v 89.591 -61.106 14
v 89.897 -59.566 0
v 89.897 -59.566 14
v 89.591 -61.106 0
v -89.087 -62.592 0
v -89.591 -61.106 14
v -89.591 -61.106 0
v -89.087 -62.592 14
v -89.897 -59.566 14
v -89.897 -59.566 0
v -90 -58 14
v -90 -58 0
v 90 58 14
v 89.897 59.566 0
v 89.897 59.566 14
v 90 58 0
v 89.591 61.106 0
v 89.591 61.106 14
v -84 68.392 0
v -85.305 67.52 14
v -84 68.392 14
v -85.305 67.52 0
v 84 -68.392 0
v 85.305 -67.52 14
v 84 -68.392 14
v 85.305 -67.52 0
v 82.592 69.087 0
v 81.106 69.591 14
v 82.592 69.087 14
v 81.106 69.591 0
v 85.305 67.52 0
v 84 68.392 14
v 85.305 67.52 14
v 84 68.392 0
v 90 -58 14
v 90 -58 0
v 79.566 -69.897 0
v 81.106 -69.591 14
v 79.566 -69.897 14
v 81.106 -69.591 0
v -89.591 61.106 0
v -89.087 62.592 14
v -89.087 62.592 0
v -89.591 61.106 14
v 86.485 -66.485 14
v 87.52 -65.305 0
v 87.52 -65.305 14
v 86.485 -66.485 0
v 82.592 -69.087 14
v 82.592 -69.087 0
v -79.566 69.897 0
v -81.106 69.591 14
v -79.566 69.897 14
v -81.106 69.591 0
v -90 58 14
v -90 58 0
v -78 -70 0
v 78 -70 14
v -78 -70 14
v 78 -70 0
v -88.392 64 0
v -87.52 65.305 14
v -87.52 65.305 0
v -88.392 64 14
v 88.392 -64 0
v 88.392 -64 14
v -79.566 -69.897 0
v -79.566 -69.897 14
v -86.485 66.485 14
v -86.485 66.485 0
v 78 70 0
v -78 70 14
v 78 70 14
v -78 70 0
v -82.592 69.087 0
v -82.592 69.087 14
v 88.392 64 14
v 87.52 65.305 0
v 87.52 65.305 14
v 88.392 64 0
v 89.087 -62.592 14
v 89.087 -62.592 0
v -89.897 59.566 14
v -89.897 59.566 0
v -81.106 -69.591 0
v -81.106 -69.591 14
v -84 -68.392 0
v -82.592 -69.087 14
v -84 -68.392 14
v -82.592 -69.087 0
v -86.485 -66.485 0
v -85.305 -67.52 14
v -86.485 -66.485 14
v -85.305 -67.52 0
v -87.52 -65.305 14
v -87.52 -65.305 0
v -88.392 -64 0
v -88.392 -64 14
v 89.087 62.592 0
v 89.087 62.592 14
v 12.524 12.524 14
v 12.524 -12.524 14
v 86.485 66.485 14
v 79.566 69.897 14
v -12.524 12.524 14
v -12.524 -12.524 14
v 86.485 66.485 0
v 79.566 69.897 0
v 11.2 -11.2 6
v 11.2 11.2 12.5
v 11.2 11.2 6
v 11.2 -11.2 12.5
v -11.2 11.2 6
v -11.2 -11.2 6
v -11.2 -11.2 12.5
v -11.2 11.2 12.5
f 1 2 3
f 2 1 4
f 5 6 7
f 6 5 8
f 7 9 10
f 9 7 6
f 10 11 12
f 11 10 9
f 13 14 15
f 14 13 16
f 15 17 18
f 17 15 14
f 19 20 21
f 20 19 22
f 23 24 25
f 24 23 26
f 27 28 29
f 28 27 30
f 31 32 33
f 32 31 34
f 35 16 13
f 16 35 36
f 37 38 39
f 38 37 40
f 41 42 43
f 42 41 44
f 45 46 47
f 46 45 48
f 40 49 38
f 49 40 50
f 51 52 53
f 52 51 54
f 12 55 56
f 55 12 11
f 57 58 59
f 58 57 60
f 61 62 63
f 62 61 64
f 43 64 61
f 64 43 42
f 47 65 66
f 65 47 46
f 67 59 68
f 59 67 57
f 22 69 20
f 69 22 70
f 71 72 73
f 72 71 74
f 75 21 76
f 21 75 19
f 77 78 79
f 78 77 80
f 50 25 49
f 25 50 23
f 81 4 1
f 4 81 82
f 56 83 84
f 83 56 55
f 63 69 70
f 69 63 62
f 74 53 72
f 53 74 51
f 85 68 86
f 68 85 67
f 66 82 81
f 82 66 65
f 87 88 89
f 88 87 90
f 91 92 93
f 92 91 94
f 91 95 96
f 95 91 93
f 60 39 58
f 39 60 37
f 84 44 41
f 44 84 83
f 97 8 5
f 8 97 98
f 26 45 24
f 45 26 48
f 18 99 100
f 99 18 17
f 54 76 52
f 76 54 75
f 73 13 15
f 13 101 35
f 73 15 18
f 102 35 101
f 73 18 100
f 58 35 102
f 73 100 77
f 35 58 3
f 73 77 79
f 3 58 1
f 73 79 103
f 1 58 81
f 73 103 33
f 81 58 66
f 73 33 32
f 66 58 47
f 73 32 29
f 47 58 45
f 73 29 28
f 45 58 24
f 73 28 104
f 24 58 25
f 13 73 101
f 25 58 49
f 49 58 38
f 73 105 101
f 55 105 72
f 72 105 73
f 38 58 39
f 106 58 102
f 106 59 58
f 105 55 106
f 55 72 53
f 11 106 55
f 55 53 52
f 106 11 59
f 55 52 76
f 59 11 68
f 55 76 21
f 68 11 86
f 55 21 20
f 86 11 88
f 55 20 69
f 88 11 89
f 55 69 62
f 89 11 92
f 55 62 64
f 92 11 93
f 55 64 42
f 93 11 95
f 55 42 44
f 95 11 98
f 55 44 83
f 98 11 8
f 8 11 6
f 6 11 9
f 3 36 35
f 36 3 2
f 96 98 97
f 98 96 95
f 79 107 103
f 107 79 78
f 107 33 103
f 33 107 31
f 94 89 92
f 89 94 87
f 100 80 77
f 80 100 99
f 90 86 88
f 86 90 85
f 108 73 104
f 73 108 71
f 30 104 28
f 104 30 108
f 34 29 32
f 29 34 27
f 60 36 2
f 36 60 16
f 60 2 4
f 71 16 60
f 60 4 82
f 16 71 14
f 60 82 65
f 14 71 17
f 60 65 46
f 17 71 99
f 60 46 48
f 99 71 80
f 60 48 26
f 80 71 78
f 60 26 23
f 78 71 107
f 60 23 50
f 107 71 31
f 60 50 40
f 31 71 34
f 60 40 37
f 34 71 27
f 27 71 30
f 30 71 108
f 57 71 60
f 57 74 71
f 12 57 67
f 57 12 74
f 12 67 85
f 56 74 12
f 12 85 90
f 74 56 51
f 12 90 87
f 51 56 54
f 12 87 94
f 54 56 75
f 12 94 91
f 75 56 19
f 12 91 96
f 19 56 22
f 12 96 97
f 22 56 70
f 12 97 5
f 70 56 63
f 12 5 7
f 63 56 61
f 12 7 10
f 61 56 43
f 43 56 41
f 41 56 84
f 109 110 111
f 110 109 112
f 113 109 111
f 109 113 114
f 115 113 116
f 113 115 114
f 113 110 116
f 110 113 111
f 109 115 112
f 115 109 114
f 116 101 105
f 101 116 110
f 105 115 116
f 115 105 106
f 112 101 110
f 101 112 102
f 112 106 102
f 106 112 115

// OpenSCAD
/* Headphone stand in three parts: base, post, hanger */
/* [Parts] */
part = "base"; // [base,post,hanger,assembly]

cadverify_only = "";
module instance(name, part, unit = 1) {
    echo(cadverify_instance = [name, part, unit]);
    if (cadverify_only == "" || cadverify_only == name) children();
}

// ---------- parameters (mm) ----------
base_L = 180;
base_W = 140;
base_H = 14;
base_corner_r = 12;
base_sock_S = 22.4;
base_sock_H = 8;
base_flare_H = 1.5;

post_bot_tenon_S = 22;
post_bot_tenon_H = 8;
post_bot_cham_H = 4;
post_body_bot_S = 30;
post_body_top_S = 24;
post_body_H = 232;
post_top_tenon_S = 18;
post_top_tenon_H = 8;
// total post height = 8+4+232+8 = 252

hanger_L = 110;
hanger_W = 44;
hanger_H = 20;
hanger_sock_S = 18.4;
hanger_sock_H = 8;
hanger_roof_H = 9.2; // half width, 45 deg pyramid

assembly_top = 270;
post_Z_in_assembly = 6;      // post print z0 sits at 6 in assembly
hanger_Z_in_assembly = 250;  // hanger print z0 sits at 250

// ---------- modules (print orientation, min z = 0) ----------
module base() {
    difference() {
        linear_extrude(height = base_H)
            hull() {
                translate([-base_L/2+base_corner_r, -base_W/2+base_corner_r]) circle(r = base_corner_r, $fn = 48);
                translate([ base_L/2-base_corner_r, -base_W/2+base_corner_r]) circle(r = base_corner_r, $fn = 48);
                translate([-base_L/2+base_corner_r,  base_W/2-base_corner_r]) circle(r = base_corner_r, $fn = 48);
                translate([ base_L/2-base_corner_r,  base_W/2-base_corner_r]) circle(r = base_corner_r, $fn = 48);
            }
        // straight socket 22.4 x 22.4 from z=6 to top
        translate([-base_sock_S/2, -base_sock_S/2, base_H - base_sock_H])
            cube([base_sock_S, base_sock_S, base_sock_H + 0.2]);
        // 45 deg entry flare, 1.5 tall: 22.4 at bottom -> 25.4 at top
        translate([0, 0, base_H - base_flare_H])
            linear_extrude(height = base_flare_H + 0.2, scale = (base_sock_S + 2*base_flare_H)/base_sock_S)
                square([base_sock_S, base_sock_S], center = true);
    }
}

module post() {
    // bottom tenon 22x22x8 on bed
    translate([-post_bot_tenon_S/2, -post_bot_tenon_S/2, 0])
        cube([post_bot_tenon_S, post_bot_tenon_S, post_bot_tenon_H]);
    // 45 deg frustum 22 -> 30, 4 tall
    translate([0, 0, post_bot_tenon_H])
        linear_extrude(height = post_bot_cham_H, scale = post_body_bot_S/post_bot_tenon_S)
            square([post_bot_tenon_S, post_bot_tenon_S], center = true);
    // tapered body 30 -> 24, 232 tall
    translate([0, 0, post_bot_tenon_H + post_bot_cham_H])
        linear_extrude(height = post_body_H, scale = post_body_top_S/post_body_bot_S)
            square([post_body_bot_S, post_body_bot_S], center = true);
    // top tenon 18x18x8
    translate([-post_top_tenon_S/2, -post_top_tenon_S/2, post_bot_tenon_H + post_bot_cham_H + post_body_H])
        cube([post_top_tenon_S, post_top_tenon_S, post_top_tenon_H]);
}

module hanger() {
    difference() {
        hull() {
            translate([-55, -22, 0]) cube([110, 44, 8]);
            translate([-50, -19, 0]) cube([20, 38, 14]);
            translate([-15, -16, 0]) cube([30, 32, 20]);
            translate([30, -19, 0]) cube([20, 38, 14]);
        }
        // straight socket 18.4x18.4, 0-8.1
        translate([-hanger_sock_S/2, -hanger_sock_S/2, -0.1])
            cube([hanger_sock_S, hanger_sock_S, hanger_sock_H + 0.2]);
        // 45 deg pyramid roof, base 18.4 at z=8, apex at z=17.2
        polyhedron(points = [[-9.2,-9.2,8],[9.2,-9.2,8],[9.2,9.2,8],[-9.2,9.2,8],[0,0,17.2]],
            faces = [[0,1,2,3],[0,1,4],[1,2,4],[2,3,4],[3,0,4]]);
    }
}

module assembly() {
    instance("base_1", "base") translate([0, 0, 0]) base();
    instance("post_1", "post") translate([0, 0, post_Z_in_assembly]) post();
    instance("hanger_1", "hanger") translate([0, 0, hanger_Z_in_assembly]) hanger();
}

// ---------- spec ----------
if (part == "base") {
    echo(cadverify_spec = [
        ["bounds", [[-90, -70, 0], [90, 70, 14]]],
        ["bodies", 1],
        ["through_holes", 0],
        ["support_faces", [["base_bottom", "-z", 20000]]],
        ["overhangs_allowed", []],
        ["copies", 1],
        ["details", [
            ["base_plate", "material", [[-90, -70, 0], [90, 70, 6]], 0.9],
            ["socket_void", "void", [[-11.2, -11.2, 6], [11.2, 11.2, 12.5]], 0.9],
            ["mouth_flare", "hole", [0, 0, 20], [0, 0, -1], [[0, 25.4], [1.5, 22.4]]],
            ["floor", "thickness", [0, 0, -5], [0, 0, 1], 6]
        ]]
    ]);
} else if (part == "post") {
    echo(cadverify_spec = [
        ["bounds", [[-15, -15, 0], [15, 15, 252]]],
        ["bodies", 1],
        ["through_holes", 0],
        ["support_faces", [["tenon_bottom", "-z", 400]]],
        ["overhangs_allowed", []],
        ["copies", 1],
        ["details", [
            ["bottom_tenon", "material", [[-11, -11, 0], [11, 11, 8]], 0.9],
            ["body_inner", "material", [[-11, -11, 30], [11, 11, 100]], 0.9],
            ["top_tenon", "material", [[-9, -9, 244], [9, 9, 252]], 0.9],
            ["side_wall", "thickness", [-30, 0, 100], [1, 0, 0], 27]
        ]]
    ]);
} else if (part == "hanger") {
    echo(cadverify_spec = [
        ["bounds", [[-55, -22, 0], [55, 22, 20]]],
        ["bodies", 1],
        ["through_holes", 0],
        ["support_faces", [["hanger_bottom", "-z", 3500]]],
        ["overhangs_allowed", []],
        ["copies", 1],
        ["details", [
            ["base_solid", "material", [[-20, -15, 0], [20, 15, 8]], 0.9],
            ["center_top", "material", [[-15, -15, 12], [15, 15, 18]], 0.9],
            ["contact_patch", "material", [[-20, -15, 8], [20, 15, 12]], 0.9],
            ["socket_void", "void", [[-9.2, -9.2, 0], [9.2, 9.2, 8]], 0.9],
            ["roof_void", "void", [[-9.2, -9.2, 8], [9.2, 9.2, 17.2]], 0.3],
            ["socket_entry", "hole", [0, 0, -5], [0, 0, 1], [[0, 18.4], [8, 18.4]]],
            ["floor", "thickness", [0, 0, 30], [0, 0, -1], 2.5],
            ["edge_thickness", "thickness", [50, 0, 30], [0, 0, -1], 13]
        ]]
    ]);
} else if (part == "assembly") {
    echo(cadverify_spec = [
        ["bounds", [[-90, -70, 0], [90, 70, 270]]],
        ["support_faces", [["desk", "-z", 20000]]],
        ["allowed_interferences", []],
        ["motions", []],
        ["assembly_order", [
            [["base_1"], [0, 0, 0]],
            [["post_1"], [0, 0, -1]],
            [["hanger_1"], [0, 0, -1]]
        ]]
    ]);
}

// ---------- output ----------
if (part == "base") base();
else if (part == "post") post();
else if (part == "hanger") hanger();
else if (part == "assembly") assembly();
